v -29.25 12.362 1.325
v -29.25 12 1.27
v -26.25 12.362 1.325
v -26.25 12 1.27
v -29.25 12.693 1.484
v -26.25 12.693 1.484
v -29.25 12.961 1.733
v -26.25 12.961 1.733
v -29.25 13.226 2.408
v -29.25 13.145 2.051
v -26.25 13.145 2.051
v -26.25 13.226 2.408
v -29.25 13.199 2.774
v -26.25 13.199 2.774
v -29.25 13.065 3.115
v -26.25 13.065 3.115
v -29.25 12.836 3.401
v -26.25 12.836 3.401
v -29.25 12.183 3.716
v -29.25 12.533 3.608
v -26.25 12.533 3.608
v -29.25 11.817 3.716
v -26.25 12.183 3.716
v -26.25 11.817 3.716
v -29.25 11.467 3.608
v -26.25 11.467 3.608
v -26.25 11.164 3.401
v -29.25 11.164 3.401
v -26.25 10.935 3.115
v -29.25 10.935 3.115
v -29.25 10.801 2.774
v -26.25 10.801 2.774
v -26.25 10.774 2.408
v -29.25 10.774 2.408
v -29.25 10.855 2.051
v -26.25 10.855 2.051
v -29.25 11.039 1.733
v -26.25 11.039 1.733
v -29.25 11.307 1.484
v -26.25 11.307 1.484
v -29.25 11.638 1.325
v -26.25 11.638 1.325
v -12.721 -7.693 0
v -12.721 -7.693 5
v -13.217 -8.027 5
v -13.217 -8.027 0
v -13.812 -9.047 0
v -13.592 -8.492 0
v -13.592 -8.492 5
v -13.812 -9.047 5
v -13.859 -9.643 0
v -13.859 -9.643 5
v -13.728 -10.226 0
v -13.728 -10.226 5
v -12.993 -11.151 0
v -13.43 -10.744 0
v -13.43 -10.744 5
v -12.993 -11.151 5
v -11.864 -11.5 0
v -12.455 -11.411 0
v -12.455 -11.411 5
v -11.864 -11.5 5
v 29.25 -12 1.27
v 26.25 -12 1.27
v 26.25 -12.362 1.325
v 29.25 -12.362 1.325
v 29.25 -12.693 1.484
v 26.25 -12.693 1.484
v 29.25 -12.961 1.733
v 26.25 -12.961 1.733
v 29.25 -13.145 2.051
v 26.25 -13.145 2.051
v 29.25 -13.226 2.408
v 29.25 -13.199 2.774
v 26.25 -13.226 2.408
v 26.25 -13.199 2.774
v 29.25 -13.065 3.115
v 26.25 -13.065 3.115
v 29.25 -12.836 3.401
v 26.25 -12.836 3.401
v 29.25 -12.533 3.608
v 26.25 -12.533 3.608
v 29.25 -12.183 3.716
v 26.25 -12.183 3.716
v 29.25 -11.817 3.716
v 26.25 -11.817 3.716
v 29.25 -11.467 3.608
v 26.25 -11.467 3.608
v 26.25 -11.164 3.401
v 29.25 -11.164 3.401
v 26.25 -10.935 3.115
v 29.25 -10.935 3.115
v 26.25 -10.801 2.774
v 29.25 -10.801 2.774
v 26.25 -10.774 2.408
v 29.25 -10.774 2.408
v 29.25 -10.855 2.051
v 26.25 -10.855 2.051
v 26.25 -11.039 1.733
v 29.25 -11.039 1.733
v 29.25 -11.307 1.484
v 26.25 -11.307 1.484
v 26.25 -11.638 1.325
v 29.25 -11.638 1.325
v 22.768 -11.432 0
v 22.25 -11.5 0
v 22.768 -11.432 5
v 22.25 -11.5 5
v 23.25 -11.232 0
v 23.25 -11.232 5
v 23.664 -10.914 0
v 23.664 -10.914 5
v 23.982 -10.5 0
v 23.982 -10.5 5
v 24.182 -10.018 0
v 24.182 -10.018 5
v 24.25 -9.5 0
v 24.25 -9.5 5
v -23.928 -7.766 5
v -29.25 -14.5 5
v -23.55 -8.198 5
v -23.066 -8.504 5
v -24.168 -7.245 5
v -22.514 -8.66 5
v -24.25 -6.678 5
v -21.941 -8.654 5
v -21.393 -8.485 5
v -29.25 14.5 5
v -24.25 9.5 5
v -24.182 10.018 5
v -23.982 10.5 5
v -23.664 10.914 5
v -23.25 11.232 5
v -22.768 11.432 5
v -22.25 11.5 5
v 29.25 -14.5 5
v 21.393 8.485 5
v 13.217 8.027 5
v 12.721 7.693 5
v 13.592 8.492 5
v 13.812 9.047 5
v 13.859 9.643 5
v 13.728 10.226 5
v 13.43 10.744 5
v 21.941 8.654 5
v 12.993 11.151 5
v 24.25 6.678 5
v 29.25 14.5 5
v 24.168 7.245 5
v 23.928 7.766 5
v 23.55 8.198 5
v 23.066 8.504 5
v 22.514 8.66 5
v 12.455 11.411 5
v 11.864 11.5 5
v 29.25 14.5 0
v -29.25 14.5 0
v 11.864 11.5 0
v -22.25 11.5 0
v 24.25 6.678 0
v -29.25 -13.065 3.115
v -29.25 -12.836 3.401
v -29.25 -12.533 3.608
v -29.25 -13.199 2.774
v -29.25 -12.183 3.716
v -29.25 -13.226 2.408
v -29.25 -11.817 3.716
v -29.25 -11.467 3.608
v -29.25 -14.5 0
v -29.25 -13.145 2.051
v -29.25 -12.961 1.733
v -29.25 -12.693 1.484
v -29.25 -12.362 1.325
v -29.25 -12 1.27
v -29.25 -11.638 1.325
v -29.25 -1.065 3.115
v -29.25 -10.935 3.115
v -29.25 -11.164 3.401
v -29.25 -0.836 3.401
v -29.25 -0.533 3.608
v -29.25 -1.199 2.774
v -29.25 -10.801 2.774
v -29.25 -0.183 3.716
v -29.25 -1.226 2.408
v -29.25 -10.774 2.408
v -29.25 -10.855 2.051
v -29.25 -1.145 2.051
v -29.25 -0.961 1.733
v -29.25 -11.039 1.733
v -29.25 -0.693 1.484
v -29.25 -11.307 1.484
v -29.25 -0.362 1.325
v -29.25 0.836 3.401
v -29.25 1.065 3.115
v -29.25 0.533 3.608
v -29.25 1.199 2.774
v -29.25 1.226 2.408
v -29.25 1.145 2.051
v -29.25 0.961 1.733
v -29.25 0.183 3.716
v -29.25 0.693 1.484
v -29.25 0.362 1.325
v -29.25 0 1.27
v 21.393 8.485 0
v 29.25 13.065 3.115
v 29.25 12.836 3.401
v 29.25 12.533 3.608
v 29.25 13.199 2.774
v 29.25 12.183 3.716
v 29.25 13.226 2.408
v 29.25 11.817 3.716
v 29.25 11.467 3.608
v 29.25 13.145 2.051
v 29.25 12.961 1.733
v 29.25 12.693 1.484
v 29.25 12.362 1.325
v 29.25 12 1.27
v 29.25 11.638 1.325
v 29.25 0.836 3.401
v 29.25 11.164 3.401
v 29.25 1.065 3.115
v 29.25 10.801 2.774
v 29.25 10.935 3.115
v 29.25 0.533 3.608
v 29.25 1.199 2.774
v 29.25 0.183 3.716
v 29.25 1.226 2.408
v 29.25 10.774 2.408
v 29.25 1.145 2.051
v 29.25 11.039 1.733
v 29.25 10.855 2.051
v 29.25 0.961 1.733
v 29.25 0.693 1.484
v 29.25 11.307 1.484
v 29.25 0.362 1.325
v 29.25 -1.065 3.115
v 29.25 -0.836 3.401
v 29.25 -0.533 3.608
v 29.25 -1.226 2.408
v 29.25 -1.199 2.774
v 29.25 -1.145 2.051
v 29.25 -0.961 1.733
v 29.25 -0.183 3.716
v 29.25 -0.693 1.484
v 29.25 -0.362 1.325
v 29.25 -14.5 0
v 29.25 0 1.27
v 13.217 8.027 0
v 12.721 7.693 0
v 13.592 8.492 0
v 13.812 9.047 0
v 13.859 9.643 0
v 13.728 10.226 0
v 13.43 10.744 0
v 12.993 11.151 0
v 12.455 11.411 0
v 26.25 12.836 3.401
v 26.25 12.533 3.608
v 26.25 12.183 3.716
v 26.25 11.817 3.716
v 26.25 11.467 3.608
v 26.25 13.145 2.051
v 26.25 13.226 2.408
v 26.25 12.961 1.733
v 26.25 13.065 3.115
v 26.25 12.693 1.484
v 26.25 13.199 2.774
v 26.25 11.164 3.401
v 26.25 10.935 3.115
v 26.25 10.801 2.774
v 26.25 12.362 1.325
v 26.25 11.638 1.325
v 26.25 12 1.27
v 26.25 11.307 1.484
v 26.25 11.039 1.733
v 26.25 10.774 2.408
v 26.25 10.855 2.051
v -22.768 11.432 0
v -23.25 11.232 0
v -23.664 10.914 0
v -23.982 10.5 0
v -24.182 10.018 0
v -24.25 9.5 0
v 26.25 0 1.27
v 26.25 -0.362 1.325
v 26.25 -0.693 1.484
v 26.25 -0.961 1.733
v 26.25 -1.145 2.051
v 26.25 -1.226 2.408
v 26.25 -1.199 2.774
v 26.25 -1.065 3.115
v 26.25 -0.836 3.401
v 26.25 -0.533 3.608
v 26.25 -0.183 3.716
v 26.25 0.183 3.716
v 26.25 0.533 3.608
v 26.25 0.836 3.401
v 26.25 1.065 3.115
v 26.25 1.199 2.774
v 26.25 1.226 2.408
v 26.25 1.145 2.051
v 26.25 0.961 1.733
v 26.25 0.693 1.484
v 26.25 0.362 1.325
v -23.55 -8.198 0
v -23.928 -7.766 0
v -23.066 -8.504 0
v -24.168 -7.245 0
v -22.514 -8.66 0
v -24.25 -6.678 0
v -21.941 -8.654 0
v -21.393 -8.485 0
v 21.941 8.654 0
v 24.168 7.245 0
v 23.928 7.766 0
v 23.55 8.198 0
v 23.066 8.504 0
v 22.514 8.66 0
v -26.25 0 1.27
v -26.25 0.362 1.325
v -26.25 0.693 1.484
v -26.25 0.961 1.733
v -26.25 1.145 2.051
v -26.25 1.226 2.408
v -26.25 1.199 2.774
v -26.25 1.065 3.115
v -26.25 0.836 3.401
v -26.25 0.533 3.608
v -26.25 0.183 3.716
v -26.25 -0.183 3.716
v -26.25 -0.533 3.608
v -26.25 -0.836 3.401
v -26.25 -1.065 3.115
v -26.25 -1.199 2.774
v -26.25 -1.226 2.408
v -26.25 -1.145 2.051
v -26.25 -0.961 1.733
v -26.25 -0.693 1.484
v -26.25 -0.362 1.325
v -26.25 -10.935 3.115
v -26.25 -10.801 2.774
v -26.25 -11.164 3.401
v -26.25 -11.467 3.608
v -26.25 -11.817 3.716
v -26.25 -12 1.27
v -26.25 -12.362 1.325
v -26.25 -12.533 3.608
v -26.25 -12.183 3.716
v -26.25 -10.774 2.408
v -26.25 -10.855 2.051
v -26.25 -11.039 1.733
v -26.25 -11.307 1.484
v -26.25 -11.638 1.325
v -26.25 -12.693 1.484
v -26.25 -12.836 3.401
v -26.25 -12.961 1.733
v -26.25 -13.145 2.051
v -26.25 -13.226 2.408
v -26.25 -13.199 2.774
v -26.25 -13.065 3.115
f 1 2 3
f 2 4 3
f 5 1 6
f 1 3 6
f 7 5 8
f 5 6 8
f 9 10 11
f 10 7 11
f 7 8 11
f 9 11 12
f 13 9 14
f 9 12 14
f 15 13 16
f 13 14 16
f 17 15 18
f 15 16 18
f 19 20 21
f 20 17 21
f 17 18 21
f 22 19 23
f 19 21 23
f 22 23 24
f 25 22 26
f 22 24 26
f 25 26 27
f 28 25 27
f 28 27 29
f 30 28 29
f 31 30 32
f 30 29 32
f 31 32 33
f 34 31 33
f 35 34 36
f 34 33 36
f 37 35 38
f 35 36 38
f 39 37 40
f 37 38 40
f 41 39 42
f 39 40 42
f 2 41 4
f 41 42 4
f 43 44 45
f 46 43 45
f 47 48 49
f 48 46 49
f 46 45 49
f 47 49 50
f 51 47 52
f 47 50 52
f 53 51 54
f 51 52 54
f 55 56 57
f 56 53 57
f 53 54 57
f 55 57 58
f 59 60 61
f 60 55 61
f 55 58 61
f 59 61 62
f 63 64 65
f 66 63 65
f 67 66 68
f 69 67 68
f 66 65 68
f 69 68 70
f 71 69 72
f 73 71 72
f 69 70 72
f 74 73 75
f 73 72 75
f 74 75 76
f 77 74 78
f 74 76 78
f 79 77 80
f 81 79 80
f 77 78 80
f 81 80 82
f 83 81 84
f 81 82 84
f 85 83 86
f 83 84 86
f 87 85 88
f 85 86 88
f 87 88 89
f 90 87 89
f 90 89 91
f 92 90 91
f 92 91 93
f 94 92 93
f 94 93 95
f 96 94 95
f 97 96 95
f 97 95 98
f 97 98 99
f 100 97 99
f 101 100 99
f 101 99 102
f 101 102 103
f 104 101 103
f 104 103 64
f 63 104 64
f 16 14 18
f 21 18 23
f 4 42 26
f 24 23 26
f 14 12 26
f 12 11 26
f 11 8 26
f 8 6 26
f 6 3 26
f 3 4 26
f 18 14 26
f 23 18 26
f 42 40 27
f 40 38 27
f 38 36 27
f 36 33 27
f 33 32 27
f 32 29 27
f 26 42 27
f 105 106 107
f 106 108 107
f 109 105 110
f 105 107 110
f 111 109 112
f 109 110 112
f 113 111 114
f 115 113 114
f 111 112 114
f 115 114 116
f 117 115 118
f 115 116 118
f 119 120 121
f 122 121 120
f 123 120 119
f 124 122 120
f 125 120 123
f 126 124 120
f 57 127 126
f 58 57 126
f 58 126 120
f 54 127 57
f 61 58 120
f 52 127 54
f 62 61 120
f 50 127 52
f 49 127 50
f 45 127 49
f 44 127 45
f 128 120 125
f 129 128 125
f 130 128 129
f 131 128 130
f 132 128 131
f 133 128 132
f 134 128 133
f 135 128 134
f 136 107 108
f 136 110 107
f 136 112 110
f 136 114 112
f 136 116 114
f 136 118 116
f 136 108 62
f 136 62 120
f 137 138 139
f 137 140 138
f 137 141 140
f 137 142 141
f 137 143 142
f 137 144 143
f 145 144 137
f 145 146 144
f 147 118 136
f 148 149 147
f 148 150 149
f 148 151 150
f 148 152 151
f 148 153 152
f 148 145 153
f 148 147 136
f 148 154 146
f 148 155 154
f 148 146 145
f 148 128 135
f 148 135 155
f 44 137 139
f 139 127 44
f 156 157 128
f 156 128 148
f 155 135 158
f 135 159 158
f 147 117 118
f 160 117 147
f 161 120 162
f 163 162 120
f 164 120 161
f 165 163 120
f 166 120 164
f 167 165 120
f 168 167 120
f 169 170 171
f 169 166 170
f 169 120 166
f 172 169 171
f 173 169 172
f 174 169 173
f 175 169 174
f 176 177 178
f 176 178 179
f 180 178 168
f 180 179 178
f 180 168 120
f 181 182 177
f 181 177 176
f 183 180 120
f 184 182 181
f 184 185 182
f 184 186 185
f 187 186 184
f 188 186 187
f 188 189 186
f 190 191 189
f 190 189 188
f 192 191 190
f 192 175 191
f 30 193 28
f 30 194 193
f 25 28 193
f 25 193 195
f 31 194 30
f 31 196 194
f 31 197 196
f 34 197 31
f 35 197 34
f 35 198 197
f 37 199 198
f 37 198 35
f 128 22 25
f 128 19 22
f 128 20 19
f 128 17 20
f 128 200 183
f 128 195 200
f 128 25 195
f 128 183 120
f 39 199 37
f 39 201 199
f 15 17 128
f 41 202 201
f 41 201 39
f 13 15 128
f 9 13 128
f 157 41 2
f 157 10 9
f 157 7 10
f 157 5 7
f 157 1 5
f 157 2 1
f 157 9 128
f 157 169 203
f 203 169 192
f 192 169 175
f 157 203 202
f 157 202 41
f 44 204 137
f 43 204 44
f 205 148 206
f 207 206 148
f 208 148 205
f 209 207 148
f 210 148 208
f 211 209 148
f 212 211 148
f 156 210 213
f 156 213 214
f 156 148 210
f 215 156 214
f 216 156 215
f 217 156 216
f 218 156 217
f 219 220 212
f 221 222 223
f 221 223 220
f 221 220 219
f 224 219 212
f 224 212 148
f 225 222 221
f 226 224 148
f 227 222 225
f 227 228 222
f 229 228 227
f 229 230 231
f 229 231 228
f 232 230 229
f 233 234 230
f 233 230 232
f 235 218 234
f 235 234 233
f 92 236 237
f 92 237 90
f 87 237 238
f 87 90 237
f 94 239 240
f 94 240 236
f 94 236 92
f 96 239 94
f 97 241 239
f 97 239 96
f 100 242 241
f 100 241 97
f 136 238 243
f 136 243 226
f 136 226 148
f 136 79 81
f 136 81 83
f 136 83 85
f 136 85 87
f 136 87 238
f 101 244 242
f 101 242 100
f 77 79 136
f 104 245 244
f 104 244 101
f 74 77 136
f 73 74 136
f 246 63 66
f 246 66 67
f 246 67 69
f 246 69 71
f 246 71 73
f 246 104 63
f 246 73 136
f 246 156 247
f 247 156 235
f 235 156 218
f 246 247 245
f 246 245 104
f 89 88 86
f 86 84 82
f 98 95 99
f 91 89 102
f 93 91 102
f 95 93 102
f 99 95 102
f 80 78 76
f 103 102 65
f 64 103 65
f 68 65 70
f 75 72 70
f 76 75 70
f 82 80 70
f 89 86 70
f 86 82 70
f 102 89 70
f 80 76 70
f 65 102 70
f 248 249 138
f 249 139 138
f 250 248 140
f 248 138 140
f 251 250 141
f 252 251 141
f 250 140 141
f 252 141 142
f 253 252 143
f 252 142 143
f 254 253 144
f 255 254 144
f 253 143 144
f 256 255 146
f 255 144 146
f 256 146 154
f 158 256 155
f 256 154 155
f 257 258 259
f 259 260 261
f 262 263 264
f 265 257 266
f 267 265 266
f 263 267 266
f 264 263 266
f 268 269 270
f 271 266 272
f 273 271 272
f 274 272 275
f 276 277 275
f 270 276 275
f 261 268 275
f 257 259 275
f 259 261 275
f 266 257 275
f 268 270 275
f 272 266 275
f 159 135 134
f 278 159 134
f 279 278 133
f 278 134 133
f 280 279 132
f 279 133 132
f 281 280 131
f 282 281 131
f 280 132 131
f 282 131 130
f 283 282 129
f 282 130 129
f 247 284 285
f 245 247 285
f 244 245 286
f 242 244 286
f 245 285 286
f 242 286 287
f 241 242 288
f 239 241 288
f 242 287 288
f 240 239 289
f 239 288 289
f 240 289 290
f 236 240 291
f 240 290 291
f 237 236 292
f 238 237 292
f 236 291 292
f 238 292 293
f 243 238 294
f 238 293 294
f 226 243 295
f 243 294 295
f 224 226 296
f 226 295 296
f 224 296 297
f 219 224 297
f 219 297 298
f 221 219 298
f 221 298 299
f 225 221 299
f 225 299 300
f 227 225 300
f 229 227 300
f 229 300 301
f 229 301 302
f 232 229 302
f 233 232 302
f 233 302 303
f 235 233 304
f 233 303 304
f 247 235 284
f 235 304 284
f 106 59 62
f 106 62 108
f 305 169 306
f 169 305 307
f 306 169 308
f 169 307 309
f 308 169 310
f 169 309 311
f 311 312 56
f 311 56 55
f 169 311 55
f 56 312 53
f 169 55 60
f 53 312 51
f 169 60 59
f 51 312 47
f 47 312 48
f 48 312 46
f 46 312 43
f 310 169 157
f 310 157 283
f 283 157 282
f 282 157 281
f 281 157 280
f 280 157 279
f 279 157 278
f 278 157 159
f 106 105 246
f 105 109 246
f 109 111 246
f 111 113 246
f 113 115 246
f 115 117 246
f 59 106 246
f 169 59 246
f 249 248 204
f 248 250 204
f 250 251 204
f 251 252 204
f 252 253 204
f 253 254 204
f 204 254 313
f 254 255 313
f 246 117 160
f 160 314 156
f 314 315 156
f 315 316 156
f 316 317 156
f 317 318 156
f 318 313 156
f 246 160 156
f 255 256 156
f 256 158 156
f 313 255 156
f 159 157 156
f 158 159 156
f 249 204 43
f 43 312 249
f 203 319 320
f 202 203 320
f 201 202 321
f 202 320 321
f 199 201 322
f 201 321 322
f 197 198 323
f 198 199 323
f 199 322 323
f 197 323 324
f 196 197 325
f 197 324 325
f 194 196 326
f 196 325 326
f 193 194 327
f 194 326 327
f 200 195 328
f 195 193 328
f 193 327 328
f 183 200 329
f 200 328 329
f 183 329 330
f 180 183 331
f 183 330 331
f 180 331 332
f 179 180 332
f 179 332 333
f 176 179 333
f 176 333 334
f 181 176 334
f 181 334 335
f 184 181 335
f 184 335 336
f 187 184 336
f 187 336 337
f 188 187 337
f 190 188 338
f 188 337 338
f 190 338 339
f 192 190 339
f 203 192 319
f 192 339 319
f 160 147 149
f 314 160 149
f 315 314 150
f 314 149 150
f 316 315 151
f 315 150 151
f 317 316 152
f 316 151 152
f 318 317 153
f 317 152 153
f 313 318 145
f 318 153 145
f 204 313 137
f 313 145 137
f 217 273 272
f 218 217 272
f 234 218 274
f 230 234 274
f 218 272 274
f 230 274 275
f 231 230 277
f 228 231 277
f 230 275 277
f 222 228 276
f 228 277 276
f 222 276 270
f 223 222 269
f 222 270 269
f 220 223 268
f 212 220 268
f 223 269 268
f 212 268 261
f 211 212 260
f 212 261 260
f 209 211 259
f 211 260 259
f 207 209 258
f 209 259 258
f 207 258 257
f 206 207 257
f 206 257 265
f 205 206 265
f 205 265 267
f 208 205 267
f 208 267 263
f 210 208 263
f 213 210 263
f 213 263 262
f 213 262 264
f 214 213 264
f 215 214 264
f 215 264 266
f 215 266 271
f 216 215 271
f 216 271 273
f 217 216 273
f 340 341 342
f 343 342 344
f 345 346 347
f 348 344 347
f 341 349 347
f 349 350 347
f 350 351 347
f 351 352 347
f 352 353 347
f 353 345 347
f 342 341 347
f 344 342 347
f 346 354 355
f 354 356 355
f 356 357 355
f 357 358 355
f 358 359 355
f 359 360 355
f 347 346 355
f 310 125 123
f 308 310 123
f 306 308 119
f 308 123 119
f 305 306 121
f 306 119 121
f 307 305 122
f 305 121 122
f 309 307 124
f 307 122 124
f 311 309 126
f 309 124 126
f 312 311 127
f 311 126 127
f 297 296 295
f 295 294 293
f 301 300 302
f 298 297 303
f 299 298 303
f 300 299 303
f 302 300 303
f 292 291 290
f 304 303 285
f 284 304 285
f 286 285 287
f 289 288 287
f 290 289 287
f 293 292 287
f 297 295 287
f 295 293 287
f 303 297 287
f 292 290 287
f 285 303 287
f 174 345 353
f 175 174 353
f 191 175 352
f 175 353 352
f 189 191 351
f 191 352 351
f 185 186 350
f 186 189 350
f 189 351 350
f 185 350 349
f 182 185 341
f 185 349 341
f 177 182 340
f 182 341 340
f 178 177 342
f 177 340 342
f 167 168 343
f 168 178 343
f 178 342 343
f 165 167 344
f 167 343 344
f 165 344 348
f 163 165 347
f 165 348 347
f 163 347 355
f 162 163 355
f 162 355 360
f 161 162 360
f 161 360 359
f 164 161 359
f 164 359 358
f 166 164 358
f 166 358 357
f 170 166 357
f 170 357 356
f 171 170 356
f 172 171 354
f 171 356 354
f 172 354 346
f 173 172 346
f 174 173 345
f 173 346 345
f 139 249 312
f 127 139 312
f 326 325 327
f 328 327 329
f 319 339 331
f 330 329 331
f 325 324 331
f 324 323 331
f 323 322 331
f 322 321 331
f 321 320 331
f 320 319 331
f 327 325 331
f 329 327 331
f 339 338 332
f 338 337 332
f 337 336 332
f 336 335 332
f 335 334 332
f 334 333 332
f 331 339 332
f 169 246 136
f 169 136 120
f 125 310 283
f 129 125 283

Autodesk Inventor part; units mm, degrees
ref_plane "YZ Plane" through (0, 0, 0) normal (1, 0, 0) x (0, 1, 0)
ref_plane "XZ Plane" through (0, 0, 0) normal (0, 1, 0) x (-1, 0, 0)
ref_plane "XY Plane" through (0, 0, 0) normal (0, 0, 1) x (1, 0, 0)
sketch "スケッチ1" plane through (0, 0, 0) normal (0, 0, 1) x (1, 0, 0)
  line L0 (-29.25, 14.5) -> (29.25, 14.5)
  line L1 (29.25, 14.5) -> (29.25, -14.5)
  line L2 (29.25, -14.5) -> (-29.25, -14.5)
  line L3 (-29.25, -14.5) -> (-29.25, 14.5)
  line L4 (-24.25, 11.5) -> (24.25, 11.5) construction
  line L5 (24.25, 11.5) -> (24.25, -11.5) construction
  line L6 (24.25, -11.5) -> (-24.25, -11.5) construction
  line L7 (-24.25, -11.5) -> (-24.25, 11.5) construction
  line L8 (24.25, 11.5) -> (-24.25, -11.5) construction
  line L9 (-24.25, -9.8399) -> (-24.25, 11.5)
  line L10 (-24.25, 11.5) -> (20.7493, 11.5)
  line L11 (20.7493, 11.5) -> (-24.25, -9.8399)
  line L12 (-20.7493, -11.5) -> (24.25, -11.5)
  line L13 (24.25, -11.5) -> (24.25, 9.8399)
  line L14 (24.25, 9.8399) -> (-20.7493, -11.5)
  line L15 (-29.25, 12) -> (29.25, 12) construction
  line L16 (29.25, -12) -> (-29.25, -12) construction
  line L17 (29.25, 12) -> (29.25, -12) construction
  point P0 (0, 0)
  point P1 (0, 11.5)
  point P2 (0, 14.5)
  point P3 (24.25, 0)
  point P4 (29.25, 0)
  dimension "d0" = 5
  dimension "d1" = 3
  dimension "d2" = 1.5
  dimension "d3" = 24
  dimension "d4" = 2.5
  dimension "d16" = 58.5
extrude "押し出し1" add sketch "スケッチ1" along normal blind 5
sketch "スケッチ2" plane through (29.25, -14.5, 0) normal (1, 0, 0) x (0, 0, -1)
  line L0 (0, 29) -> (-5, 29) projected
  line L1 (-5, 0) -> (-5, 29) projected
  line L2 (0, 14.5) -> (-5, 14.5) construction
  point P0 (-2.5, 2.5)
  point P1 (-2.5, 14.5)
  point P2 (-2.5, 26.5)
  point P3 (-2.5, 29)
  dimension "d7" = 24
hole "穴1" at (29.25, -12, 2.5) at (29.25, 0, 2.5) at (29.25, 12, 2.5) direction (-1, 0, 0) diameter 2.459 depth 3 thread size "M3x0.5" class "6H" standard "ISO Metric profile"
mirror "ミラー1" about plane through (0, 0, 0) normal (1, 0, 0) of "穴1"
fillet "フィレット1" radius 2 6 edges at (-20.7493, -11.5, 2.5) (-24.25, -9.8399, 2.5) (24.25, 9.8399, 2.5) (24.25, -11.5, 2.5) (-24.25, 11.5, 2.5) (20.7493, 11.5, 2.5)
equation "\"d3\" = d5_1"
equation "\"d7\" = d3"
equation "\"d5_1\" = 24"
properties part number "リンク_ふくらはぎ_サブフレーム_1_2(予備案)" material "アルミニウム 2014-T4"
